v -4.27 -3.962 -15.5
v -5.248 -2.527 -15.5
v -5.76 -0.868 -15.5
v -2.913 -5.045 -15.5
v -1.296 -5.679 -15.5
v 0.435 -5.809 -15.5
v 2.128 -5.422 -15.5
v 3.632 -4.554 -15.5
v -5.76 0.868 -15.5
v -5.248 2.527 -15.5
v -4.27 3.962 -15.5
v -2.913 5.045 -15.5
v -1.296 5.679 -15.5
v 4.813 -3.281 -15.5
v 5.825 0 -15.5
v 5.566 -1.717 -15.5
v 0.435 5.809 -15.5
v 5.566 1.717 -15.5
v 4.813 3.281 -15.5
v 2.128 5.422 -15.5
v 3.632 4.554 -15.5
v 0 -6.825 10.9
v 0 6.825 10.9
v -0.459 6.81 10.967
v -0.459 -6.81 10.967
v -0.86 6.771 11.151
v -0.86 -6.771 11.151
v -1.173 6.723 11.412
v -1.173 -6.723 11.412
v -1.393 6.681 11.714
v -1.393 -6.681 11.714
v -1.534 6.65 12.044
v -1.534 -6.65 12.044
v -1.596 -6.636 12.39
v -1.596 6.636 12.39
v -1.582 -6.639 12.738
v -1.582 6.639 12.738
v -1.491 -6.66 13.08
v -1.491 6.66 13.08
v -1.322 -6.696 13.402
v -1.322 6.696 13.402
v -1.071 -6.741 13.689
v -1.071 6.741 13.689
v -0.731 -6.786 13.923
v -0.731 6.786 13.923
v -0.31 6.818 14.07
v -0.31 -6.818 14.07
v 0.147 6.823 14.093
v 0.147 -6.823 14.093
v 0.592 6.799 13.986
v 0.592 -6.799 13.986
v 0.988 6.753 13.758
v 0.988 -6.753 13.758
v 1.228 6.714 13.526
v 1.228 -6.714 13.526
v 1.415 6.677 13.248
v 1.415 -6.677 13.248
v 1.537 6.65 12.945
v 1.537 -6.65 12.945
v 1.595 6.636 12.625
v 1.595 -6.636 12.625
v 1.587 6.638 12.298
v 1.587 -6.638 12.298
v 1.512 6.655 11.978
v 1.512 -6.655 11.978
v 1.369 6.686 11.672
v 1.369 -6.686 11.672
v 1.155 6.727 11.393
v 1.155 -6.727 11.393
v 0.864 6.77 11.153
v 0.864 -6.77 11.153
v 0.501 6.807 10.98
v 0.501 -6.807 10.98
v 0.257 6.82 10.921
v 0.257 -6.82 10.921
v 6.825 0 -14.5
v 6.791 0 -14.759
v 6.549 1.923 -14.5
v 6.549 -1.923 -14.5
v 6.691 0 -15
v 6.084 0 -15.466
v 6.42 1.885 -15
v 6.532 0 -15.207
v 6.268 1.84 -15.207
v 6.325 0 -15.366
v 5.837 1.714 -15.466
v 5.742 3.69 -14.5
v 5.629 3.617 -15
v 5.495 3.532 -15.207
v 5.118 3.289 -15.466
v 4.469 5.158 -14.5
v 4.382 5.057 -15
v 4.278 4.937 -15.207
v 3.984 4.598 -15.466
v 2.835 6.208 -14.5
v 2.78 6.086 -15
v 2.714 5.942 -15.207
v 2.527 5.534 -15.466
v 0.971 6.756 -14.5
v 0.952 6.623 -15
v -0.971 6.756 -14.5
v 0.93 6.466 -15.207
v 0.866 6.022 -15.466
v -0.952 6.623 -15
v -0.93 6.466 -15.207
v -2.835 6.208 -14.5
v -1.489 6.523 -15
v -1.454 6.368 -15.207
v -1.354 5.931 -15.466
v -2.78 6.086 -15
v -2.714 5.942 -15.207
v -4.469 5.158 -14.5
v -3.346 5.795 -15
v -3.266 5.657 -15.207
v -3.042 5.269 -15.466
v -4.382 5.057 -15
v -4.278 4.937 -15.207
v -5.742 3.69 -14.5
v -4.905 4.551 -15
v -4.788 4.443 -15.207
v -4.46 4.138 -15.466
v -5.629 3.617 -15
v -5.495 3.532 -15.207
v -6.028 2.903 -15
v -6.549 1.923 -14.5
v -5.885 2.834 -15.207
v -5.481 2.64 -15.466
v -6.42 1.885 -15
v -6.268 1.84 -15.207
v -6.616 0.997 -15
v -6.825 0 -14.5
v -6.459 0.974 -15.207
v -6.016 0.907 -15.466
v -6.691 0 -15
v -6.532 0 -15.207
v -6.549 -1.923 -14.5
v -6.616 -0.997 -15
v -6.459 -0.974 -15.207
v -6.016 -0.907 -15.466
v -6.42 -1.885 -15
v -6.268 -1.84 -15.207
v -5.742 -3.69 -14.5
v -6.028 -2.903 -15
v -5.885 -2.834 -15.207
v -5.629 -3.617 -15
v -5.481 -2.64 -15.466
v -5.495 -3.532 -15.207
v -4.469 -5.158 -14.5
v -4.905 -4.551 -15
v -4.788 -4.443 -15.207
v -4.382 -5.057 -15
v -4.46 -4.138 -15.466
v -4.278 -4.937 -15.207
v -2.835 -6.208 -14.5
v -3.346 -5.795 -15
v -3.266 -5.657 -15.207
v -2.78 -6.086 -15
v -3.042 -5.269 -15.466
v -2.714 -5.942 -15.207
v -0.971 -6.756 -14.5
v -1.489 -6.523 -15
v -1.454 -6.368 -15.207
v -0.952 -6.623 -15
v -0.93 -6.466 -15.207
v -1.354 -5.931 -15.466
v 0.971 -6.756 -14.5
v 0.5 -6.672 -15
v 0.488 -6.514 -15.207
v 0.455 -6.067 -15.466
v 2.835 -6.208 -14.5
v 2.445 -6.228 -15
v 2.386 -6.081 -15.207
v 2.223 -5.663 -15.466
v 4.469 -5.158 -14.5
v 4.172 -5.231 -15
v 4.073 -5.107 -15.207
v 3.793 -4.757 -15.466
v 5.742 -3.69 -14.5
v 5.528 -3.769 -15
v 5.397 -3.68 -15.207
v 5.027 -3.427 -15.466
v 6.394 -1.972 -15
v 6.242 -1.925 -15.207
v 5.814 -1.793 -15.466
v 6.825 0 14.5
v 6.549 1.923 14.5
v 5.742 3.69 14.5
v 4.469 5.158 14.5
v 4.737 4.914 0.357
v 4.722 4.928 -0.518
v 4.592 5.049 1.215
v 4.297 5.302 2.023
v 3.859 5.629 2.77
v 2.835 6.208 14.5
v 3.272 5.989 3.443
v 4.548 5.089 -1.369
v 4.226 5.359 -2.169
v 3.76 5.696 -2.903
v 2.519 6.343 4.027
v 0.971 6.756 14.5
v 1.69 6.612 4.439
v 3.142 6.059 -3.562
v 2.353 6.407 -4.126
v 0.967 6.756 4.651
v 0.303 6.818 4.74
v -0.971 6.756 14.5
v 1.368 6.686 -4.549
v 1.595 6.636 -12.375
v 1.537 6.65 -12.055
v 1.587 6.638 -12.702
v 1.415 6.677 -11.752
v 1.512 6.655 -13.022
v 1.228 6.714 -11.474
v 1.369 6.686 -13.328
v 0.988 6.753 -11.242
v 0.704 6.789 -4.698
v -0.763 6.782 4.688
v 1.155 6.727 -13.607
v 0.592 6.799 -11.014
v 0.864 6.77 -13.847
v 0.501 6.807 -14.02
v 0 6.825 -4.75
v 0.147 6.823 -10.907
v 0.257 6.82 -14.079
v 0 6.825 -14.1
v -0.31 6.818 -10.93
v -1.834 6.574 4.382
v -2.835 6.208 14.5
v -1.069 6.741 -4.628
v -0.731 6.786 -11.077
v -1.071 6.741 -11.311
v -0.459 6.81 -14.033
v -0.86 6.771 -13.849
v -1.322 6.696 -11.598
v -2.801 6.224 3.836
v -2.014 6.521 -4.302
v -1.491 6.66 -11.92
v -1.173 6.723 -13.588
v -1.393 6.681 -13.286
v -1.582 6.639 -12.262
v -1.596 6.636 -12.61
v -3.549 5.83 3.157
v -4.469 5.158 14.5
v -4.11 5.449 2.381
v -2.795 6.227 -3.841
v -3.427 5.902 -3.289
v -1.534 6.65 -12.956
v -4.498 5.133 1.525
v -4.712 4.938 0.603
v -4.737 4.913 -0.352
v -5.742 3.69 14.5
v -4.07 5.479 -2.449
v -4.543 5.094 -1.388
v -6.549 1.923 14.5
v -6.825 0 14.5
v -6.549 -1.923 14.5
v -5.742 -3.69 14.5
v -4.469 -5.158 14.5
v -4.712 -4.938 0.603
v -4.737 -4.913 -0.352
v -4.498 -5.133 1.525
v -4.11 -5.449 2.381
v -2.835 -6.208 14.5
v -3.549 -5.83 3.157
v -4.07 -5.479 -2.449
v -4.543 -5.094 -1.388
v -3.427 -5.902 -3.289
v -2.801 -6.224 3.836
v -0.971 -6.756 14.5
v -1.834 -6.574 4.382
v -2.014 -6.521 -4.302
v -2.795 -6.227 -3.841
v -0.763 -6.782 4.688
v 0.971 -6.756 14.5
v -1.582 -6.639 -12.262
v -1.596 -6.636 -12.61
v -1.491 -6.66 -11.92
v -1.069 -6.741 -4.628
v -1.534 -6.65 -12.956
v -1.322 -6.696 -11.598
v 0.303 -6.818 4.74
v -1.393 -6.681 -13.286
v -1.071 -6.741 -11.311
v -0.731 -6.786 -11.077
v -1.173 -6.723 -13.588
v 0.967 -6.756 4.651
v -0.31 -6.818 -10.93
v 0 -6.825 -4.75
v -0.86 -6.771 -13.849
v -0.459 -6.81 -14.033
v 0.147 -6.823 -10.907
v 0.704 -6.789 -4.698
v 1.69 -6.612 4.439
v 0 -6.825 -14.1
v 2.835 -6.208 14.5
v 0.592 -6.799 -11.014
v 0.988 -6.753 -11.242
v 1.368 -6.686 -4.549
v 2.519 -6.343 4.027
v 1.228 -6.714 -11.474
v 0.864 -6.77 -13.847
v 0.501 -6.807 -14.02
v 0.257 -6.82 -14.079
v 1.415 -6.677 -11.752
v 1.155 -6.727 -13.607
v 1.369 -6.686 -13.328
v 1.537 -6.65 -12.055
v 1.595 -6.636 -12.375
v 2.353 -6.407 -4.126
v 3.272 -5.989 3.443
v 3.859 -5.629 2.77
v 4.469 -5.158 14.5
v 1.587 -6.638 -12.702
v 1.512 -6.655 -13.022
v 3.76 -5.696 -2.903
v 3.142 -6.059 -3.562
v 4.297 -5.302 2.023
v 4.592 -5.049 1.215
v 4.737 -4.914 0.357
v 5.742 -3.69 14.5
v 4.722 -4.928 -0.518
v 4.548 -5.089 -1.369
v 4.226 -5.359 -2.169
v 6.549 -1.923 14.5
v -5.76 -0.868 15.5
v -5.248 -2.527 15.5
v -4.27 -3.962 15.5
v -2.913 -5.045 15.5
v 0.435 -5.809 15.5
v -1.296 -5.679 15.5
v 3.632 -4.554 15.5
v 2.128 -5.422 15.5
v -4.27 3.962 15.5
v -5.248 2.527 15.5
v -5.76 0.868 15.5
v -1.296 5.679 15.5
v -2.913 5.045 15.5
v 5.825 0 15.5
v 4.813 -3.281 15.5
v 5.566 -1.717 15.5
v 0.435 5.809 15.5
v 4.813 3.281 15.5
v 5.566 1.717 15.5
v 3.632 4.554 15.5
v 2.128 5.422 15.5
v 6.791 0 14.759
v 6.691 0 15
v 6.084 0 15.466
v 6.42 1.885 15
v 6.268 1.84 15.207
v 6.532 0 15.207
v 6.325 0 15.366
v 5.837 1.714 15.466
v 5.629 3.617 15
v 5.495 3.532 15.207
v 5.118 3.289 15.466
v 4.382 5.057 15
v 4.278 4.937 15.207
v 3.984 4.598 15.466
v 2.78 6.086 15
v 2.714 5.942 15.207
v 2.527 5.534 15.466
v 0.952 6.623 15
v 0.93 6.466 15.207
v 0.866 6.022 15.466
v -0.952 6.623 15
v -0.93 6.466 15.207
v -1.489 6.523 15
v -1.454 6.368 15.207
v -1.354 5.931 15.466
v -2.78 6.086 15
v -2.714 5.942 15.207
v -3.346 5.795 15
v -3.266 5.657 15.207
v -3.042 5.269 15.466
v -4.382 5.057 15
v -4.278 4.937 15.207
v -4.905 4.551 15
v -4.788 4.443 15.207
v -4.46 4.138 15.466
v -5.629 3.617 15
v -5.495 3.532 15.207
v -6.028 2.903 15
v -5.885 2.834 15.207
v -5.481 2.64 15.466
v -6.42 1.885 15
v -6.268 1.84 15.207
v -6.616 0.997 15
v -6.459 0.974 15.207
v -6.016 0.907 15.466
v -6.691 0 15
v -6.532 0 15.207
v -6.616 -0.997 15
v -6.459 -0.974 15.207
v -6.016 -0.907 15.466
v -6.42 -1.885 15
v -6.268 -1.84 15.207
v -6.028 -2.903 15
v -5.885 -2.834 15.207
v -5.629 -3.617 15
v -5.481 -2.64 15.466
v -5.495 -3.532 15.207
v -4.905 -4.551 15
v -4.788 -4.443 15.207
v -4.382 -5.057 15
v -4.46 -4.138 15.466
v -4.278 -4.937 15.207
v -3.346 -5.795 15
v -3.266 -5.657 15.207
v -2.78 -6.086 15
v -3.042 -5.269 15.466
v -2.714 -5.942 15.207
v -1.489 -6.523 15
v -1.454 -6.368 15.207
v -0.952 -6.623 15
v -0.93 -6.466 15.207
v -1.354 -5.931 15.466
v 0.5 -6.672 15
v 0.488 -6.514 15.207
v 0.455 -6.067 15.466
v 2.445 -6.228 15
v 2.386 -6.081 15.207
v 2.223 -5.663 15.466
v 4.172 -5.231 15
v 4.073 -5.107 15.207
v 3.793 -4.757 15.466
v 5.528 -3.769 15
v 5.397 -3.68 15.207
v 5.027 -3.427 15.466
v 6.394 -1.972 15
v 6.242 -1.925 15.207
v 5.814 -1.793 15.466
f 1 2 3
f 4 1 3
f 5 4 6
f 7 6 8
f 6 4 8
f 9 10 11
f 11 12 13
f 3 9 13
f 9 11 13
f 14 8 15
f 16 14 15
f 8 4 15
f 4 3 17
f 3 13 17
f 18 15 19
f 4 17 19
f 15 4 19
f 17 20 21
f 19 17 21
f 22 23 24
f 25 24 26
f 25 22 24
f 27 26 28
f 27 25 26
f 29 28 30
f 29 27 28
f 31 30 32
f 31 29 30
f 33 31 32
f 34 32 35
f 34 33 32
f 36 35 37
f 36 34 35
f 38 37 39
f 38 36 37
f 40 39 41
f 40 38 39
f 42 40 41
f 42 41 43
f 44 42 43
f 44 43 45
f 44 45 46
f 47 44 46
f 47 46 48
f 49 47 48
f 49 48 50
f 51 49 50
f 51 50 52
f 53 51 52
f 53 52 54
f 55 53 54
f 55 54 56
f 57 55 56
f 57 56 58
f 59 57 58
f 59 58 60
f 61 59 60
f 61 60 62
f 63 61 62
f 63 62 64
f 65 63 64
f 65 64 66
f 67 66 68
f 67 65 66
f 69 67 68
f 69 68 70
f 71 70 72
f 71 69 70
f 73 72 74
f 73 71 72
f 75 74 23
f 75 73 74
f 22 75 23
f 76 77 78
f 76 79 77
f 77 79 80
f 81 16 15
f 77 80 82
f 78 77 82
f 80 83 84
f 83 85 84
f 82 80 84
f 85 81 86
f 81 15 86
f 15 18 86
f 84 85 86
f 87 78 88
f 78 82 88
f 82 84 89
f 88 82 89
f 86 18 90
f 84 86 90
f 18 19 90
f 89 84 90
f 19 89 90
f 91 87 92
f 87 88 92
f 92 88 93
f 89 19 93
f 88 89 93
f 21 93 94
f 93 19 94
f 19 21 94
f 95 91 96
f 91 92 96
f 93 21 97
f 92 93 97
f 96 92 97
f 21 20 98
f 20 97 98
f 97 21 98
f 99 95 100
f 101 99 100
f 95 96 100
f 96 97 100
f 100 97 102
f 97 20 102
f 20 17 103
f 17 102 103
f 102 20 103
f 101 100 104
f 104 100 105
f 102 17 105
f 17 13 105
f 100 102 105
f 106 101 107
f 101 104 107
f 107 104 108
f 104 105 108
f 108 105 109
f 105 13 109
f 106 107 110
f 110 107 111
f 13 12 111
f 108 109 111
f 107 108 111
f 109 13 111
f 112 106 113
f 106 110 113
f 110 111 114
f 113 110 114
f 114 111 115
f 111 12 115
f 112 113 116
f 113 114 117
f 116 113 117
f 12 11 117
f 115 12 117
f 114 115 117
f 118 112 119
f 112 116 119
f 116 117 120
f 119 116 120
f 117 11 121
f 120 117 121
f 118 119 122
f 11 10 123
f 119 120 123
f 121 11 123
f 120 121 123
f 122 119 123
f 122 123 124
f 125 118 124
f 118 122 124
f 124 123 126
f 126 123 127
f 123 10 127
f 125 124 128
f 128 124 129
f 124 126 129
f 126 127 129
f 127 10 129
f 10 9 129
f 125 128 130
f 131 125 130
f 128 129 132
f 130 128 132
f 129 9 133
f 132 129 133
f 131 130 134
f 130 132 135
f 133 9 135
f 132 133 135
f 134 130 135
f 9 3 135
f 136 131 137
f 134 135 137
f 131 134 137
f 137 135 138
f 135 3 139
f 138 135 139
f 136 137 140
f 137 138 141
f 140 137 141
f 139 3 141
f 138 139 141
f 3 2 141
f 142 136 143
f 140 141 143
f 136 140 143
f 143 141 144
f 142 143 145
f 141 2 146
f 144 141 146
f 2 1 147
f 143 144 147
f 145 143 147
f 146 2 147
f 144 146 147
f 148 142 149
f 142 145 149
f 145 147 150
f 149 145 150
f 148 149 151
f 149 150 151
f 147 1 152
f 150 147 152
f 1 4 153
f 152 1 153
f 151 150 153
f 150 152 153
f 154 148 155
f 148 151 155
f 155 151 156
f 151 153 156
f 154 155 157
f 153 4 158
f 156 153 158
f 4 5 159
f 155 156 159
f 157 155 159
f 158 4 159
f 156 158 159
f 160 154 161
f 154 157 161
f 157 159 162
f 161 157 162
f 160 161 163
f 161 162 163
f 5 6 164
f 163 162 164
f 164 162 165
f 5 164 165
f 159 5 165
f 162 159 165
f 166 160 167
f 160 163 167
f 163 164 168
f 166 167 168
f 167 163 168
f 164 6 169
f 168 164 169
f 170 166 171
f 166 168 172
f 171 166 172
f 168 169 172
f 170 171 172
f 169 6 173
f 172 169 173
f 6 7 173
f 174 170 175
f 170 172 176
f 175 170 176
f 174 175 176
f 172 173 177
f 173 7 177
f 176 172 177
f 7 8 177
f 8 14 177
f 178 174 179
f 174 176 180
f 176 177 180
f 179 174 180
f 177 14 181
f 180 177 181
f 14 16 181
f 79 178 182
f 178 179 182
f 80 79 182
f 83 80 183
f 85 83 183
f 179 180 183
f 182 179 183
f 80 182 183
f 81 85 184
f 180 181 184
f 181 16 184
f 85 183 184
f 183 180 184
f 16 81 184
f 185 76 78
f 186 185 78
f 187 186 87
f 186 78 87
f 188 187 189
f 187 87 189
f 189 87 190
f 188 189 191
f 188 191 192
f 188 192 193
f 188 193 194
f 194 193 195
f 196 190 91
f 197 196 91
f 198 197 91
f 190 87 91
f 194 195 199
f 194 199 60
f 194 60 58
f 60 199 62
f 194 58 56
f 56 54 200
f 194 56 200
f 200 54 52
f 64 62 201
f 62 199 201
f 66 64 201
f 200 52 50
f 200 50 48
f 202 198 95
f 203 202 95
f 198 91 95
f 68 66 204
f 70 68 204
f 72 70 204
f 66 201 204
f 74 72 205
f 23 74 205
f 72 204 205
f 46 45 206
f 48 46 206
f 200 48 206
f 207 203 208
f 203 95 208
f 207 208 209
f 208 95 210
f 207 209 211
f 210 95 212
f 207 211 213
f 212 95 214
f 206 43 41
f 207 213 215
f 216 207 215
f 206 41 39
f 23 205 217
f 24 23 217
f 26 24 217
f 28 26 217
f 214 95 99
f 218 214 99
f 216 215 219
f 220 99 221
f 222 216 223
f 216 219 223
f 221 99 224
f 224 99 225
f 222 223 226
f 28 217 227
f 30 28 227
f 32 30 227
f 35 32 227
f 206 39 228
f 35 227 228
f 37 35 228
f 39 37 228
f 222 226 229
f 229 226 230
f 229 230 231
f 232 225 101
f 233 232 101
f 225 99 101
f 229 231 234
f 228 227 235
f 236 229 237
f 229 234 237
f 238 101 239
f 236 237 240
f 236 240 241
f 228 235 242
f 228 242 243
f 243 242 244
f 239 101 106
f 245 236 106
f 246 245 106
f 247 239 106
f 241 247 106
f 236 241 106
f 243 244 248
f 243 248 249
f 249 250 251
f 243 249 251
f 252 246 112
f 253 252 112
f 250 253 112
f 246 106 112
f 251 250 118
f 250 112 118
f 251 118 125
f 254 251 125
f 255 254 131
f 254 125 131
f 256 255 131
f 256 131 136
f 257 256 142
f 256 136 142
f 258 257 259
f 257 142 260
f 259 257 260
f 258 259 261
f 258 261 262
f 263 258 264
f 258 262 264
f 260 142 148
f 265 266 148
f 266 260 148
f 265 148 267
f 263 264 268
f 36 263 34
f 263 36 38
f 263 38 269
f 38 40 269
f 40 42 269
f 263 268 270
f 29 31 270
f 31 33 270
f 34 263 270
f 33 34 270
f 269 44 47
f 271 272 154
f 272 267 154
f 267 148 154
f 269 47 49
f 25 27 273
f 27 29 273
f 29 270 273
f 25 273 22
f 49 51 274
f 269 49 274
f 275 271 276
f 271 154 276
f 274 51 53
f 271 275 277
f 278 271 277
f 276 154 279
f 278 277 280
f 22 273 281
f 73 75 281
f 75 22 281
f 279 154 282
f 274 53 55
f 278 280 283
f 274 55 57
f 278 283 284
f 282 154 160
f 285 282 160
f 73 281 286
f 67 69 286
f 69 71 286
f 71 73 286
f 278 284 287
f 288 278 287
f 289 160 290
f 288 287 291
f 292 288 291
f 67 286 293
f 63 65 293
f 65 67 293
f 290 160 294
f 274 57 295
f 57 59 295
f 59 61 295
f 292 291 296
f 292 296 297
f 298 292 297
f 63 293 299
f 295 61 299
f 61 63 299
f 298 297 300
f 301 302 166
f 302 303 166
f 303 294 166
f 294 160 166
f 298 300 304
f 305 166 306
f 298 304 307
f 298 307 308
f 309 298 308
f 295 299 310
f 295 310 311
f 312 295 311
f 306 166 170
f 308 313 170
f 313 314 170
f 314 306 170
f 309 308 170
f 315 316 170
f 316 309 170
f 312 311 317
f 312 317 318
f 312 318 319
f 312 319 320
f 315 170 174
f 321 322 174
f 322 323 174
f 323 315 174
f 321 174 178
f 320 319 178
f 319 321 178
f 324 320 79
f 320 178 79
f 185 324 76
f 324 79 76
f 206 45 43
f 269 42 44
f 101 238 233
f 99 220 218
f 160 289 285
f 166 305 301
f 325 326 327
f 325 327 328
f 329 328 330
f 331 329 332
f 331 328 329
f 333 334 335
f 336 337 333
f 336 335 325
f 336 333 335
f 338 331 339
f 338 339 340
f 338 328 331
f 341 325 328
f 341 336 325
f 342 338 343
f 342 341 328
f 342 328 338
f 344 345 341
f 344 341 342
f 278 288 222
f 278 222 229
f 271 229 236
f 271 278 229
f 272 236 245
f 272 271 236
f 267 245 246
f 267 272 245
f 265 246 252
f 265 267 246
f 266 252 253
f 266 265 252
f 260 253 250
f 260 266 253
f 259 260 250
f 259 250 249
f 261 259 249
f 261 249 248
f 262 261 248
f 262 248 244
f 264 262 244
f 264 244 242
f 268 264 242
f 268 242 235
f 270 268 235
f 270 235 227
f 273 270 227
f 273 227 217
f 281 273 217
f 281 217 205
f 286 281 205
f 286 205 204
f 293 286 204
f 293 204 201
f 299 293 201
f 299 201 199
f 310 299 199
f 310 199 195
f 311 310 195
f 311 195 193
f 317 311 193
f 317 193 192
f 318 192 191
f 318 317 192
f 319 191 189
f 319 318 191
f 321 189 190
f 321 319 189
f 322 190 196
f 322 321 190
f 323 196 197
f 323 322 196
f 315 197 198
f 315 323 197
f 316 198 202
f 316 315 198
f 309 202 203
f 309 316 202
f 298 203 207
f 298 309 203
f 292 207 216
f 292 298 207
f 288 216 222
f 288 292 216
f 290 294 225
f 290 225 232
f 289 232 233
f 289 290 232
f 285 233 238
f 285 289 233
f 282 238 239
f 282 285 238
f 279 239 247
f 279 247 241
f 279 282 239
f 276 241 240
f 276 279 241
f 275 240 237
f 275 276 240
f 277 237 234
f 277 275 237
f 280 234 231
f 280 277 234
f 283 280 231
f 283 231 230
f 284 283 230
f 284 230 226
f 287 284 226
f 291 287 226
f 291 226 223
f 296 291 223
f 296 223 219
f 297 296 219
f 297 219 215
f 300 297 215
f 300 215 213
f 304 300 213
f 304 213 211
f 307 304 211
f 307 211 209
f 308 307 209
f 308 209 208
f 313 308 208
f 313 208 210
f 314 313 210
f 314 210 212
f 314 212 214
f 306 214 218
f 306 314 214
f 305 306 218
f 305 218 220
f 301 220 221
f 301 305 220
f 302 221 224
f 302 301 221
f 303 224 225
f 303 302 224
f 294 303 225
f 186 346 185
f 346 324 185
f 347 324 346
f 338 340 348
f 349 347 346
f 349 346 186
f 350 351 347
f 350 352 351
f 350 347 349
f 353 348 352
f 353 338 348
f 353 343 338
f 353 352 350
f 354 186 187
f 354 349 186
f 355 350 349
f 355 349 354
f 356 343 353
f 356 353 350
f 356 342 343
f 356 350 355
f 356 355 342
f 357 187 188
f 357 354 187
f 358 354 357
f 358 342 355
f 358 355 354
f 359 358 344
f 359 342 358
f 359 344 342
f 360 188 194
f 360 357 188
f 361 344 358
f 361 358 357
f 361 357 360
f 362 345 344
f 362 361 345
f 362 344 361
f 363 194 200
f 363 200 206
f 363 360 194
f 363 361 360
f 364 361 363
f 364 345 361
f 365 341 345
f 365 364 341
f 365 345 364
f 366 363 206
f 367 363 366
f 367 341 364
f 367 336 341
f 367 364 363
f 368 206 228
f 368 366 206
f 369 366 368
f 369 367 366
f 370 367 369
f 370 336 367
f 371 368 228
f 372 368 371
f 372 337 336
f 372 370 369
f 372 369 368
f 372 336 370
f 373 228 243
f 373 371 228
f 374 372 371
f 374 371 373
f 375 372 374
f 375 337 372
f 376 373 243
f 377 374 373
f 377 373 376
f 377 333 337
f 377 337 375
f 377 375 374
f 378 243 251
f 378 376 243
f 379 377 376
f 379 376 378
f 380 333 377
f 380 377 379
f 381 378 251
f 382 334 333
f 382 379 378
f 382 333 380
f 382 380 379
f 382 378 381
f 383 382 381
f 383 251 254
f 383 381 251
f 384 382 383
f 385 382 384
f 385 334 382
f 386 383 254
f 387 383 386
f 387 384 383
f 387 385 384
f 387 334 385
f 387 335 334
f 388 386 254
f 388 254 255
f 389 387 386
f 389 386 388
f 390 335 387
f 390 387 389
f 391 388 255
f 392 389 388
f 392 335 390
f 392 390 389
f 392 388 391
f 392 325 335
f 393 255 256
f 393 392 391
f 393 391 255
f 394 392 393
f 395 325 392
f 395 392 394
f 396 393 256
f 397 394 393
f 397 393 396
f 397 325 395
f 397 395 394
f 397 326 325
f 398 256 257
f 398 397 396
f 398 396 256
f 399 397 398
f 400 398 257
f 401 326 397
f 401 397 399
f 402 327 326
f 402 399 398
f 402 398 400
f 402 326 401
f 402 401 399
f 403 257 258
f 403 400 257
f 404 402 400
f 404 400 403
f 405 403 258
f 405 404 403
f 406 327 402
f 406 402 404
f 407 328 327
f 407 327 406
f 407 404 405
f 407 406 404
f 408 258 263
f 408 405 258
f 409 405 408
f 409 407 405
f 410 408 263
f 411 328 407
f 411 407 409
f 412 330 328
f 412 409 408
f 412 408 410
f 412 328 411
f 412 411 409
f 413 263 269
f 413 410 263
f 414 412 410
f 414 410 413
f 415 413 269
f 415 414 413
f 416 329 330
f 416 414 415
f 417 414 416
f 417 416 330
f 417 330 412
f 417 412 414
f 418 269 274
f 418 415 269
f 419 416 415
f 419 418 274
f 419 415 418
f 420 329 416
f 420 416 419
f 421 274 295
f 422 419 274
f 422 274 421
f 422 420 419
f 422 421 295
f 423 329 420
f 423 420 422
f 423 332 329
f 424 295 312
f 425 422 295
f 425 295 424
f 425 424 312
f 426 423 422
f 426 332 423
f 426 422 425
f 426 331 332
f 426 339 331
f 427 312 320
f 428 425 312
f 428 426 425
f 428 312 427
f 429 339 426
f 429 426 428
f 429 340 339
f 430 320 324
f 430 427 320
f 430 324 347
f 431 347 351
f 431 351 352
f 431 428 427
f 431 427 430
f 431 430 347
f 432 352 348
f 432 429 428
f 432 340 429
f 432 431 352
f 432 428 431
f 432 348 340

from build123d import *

# Parameters (mm, degrees)
BOSS_EXTRUDE1_DEPTH      = 15.5
BOSS_EXTRUDE1_DEPTH_BACK = 15.5
SKETCH1_R                = 6.825
CUT_EXTRUDE1_DEPTH       = 10
CUT_EXTRUDE1_DEPTH_BACK  = 10
SKETCH2_R                = 4.75
SKETCH2_R_2              = 1.6
FILLET1_R                = 1


with BuildPart() as part:
    # Sketch1 → Boss-Extrude1 (new, two sides: drawn at the far end of the back side and taken through both)
    with BuildSketch(Plane.XY.offset(-BOSS_EXTRUDE1_DEPTH_BACK)):
        Circle(SKETCH1_R)
    extrude(amount=BOSS_EXTRUDE1_DEPTH + BOSS_EXTRUDE1_DEPTH_BACK)

    # Sketch2 → Cut-Extrude1 (cut, two sides: drawn at the far end of the back side and taken through both)
    with BuildSketch(Plane(origin=(0, 0, 0), x_dir=(1, 0, 0), z_dir=(0, 1, 0)).offset(-CUT_EXTRUDE1_DEPTH_BACK)):
        Circle(SKETCH2_R)
        with Locations((0, -12.5)):
            Circle(SKETCH2_R_2)
        with Locations((0, 12.5)):
            Circle(SKETCH2_R_2)
    extrude(amount=CUT_EXTRUDE1_DEPTH + CUT_EXTRUDE1_DEPTH_BACK, mode=Mode.SUBTRACT)

    # Fillet1
    fillet1_edges = [part.edges().sort_by_distance(p)[0] for p in [
        (-6.825, 0, 15.5),
        (-6.825, 0, -15.5),
    ]]
    fillet(fillet1_edges, radius=FILLET1_R)


solid = part.part
